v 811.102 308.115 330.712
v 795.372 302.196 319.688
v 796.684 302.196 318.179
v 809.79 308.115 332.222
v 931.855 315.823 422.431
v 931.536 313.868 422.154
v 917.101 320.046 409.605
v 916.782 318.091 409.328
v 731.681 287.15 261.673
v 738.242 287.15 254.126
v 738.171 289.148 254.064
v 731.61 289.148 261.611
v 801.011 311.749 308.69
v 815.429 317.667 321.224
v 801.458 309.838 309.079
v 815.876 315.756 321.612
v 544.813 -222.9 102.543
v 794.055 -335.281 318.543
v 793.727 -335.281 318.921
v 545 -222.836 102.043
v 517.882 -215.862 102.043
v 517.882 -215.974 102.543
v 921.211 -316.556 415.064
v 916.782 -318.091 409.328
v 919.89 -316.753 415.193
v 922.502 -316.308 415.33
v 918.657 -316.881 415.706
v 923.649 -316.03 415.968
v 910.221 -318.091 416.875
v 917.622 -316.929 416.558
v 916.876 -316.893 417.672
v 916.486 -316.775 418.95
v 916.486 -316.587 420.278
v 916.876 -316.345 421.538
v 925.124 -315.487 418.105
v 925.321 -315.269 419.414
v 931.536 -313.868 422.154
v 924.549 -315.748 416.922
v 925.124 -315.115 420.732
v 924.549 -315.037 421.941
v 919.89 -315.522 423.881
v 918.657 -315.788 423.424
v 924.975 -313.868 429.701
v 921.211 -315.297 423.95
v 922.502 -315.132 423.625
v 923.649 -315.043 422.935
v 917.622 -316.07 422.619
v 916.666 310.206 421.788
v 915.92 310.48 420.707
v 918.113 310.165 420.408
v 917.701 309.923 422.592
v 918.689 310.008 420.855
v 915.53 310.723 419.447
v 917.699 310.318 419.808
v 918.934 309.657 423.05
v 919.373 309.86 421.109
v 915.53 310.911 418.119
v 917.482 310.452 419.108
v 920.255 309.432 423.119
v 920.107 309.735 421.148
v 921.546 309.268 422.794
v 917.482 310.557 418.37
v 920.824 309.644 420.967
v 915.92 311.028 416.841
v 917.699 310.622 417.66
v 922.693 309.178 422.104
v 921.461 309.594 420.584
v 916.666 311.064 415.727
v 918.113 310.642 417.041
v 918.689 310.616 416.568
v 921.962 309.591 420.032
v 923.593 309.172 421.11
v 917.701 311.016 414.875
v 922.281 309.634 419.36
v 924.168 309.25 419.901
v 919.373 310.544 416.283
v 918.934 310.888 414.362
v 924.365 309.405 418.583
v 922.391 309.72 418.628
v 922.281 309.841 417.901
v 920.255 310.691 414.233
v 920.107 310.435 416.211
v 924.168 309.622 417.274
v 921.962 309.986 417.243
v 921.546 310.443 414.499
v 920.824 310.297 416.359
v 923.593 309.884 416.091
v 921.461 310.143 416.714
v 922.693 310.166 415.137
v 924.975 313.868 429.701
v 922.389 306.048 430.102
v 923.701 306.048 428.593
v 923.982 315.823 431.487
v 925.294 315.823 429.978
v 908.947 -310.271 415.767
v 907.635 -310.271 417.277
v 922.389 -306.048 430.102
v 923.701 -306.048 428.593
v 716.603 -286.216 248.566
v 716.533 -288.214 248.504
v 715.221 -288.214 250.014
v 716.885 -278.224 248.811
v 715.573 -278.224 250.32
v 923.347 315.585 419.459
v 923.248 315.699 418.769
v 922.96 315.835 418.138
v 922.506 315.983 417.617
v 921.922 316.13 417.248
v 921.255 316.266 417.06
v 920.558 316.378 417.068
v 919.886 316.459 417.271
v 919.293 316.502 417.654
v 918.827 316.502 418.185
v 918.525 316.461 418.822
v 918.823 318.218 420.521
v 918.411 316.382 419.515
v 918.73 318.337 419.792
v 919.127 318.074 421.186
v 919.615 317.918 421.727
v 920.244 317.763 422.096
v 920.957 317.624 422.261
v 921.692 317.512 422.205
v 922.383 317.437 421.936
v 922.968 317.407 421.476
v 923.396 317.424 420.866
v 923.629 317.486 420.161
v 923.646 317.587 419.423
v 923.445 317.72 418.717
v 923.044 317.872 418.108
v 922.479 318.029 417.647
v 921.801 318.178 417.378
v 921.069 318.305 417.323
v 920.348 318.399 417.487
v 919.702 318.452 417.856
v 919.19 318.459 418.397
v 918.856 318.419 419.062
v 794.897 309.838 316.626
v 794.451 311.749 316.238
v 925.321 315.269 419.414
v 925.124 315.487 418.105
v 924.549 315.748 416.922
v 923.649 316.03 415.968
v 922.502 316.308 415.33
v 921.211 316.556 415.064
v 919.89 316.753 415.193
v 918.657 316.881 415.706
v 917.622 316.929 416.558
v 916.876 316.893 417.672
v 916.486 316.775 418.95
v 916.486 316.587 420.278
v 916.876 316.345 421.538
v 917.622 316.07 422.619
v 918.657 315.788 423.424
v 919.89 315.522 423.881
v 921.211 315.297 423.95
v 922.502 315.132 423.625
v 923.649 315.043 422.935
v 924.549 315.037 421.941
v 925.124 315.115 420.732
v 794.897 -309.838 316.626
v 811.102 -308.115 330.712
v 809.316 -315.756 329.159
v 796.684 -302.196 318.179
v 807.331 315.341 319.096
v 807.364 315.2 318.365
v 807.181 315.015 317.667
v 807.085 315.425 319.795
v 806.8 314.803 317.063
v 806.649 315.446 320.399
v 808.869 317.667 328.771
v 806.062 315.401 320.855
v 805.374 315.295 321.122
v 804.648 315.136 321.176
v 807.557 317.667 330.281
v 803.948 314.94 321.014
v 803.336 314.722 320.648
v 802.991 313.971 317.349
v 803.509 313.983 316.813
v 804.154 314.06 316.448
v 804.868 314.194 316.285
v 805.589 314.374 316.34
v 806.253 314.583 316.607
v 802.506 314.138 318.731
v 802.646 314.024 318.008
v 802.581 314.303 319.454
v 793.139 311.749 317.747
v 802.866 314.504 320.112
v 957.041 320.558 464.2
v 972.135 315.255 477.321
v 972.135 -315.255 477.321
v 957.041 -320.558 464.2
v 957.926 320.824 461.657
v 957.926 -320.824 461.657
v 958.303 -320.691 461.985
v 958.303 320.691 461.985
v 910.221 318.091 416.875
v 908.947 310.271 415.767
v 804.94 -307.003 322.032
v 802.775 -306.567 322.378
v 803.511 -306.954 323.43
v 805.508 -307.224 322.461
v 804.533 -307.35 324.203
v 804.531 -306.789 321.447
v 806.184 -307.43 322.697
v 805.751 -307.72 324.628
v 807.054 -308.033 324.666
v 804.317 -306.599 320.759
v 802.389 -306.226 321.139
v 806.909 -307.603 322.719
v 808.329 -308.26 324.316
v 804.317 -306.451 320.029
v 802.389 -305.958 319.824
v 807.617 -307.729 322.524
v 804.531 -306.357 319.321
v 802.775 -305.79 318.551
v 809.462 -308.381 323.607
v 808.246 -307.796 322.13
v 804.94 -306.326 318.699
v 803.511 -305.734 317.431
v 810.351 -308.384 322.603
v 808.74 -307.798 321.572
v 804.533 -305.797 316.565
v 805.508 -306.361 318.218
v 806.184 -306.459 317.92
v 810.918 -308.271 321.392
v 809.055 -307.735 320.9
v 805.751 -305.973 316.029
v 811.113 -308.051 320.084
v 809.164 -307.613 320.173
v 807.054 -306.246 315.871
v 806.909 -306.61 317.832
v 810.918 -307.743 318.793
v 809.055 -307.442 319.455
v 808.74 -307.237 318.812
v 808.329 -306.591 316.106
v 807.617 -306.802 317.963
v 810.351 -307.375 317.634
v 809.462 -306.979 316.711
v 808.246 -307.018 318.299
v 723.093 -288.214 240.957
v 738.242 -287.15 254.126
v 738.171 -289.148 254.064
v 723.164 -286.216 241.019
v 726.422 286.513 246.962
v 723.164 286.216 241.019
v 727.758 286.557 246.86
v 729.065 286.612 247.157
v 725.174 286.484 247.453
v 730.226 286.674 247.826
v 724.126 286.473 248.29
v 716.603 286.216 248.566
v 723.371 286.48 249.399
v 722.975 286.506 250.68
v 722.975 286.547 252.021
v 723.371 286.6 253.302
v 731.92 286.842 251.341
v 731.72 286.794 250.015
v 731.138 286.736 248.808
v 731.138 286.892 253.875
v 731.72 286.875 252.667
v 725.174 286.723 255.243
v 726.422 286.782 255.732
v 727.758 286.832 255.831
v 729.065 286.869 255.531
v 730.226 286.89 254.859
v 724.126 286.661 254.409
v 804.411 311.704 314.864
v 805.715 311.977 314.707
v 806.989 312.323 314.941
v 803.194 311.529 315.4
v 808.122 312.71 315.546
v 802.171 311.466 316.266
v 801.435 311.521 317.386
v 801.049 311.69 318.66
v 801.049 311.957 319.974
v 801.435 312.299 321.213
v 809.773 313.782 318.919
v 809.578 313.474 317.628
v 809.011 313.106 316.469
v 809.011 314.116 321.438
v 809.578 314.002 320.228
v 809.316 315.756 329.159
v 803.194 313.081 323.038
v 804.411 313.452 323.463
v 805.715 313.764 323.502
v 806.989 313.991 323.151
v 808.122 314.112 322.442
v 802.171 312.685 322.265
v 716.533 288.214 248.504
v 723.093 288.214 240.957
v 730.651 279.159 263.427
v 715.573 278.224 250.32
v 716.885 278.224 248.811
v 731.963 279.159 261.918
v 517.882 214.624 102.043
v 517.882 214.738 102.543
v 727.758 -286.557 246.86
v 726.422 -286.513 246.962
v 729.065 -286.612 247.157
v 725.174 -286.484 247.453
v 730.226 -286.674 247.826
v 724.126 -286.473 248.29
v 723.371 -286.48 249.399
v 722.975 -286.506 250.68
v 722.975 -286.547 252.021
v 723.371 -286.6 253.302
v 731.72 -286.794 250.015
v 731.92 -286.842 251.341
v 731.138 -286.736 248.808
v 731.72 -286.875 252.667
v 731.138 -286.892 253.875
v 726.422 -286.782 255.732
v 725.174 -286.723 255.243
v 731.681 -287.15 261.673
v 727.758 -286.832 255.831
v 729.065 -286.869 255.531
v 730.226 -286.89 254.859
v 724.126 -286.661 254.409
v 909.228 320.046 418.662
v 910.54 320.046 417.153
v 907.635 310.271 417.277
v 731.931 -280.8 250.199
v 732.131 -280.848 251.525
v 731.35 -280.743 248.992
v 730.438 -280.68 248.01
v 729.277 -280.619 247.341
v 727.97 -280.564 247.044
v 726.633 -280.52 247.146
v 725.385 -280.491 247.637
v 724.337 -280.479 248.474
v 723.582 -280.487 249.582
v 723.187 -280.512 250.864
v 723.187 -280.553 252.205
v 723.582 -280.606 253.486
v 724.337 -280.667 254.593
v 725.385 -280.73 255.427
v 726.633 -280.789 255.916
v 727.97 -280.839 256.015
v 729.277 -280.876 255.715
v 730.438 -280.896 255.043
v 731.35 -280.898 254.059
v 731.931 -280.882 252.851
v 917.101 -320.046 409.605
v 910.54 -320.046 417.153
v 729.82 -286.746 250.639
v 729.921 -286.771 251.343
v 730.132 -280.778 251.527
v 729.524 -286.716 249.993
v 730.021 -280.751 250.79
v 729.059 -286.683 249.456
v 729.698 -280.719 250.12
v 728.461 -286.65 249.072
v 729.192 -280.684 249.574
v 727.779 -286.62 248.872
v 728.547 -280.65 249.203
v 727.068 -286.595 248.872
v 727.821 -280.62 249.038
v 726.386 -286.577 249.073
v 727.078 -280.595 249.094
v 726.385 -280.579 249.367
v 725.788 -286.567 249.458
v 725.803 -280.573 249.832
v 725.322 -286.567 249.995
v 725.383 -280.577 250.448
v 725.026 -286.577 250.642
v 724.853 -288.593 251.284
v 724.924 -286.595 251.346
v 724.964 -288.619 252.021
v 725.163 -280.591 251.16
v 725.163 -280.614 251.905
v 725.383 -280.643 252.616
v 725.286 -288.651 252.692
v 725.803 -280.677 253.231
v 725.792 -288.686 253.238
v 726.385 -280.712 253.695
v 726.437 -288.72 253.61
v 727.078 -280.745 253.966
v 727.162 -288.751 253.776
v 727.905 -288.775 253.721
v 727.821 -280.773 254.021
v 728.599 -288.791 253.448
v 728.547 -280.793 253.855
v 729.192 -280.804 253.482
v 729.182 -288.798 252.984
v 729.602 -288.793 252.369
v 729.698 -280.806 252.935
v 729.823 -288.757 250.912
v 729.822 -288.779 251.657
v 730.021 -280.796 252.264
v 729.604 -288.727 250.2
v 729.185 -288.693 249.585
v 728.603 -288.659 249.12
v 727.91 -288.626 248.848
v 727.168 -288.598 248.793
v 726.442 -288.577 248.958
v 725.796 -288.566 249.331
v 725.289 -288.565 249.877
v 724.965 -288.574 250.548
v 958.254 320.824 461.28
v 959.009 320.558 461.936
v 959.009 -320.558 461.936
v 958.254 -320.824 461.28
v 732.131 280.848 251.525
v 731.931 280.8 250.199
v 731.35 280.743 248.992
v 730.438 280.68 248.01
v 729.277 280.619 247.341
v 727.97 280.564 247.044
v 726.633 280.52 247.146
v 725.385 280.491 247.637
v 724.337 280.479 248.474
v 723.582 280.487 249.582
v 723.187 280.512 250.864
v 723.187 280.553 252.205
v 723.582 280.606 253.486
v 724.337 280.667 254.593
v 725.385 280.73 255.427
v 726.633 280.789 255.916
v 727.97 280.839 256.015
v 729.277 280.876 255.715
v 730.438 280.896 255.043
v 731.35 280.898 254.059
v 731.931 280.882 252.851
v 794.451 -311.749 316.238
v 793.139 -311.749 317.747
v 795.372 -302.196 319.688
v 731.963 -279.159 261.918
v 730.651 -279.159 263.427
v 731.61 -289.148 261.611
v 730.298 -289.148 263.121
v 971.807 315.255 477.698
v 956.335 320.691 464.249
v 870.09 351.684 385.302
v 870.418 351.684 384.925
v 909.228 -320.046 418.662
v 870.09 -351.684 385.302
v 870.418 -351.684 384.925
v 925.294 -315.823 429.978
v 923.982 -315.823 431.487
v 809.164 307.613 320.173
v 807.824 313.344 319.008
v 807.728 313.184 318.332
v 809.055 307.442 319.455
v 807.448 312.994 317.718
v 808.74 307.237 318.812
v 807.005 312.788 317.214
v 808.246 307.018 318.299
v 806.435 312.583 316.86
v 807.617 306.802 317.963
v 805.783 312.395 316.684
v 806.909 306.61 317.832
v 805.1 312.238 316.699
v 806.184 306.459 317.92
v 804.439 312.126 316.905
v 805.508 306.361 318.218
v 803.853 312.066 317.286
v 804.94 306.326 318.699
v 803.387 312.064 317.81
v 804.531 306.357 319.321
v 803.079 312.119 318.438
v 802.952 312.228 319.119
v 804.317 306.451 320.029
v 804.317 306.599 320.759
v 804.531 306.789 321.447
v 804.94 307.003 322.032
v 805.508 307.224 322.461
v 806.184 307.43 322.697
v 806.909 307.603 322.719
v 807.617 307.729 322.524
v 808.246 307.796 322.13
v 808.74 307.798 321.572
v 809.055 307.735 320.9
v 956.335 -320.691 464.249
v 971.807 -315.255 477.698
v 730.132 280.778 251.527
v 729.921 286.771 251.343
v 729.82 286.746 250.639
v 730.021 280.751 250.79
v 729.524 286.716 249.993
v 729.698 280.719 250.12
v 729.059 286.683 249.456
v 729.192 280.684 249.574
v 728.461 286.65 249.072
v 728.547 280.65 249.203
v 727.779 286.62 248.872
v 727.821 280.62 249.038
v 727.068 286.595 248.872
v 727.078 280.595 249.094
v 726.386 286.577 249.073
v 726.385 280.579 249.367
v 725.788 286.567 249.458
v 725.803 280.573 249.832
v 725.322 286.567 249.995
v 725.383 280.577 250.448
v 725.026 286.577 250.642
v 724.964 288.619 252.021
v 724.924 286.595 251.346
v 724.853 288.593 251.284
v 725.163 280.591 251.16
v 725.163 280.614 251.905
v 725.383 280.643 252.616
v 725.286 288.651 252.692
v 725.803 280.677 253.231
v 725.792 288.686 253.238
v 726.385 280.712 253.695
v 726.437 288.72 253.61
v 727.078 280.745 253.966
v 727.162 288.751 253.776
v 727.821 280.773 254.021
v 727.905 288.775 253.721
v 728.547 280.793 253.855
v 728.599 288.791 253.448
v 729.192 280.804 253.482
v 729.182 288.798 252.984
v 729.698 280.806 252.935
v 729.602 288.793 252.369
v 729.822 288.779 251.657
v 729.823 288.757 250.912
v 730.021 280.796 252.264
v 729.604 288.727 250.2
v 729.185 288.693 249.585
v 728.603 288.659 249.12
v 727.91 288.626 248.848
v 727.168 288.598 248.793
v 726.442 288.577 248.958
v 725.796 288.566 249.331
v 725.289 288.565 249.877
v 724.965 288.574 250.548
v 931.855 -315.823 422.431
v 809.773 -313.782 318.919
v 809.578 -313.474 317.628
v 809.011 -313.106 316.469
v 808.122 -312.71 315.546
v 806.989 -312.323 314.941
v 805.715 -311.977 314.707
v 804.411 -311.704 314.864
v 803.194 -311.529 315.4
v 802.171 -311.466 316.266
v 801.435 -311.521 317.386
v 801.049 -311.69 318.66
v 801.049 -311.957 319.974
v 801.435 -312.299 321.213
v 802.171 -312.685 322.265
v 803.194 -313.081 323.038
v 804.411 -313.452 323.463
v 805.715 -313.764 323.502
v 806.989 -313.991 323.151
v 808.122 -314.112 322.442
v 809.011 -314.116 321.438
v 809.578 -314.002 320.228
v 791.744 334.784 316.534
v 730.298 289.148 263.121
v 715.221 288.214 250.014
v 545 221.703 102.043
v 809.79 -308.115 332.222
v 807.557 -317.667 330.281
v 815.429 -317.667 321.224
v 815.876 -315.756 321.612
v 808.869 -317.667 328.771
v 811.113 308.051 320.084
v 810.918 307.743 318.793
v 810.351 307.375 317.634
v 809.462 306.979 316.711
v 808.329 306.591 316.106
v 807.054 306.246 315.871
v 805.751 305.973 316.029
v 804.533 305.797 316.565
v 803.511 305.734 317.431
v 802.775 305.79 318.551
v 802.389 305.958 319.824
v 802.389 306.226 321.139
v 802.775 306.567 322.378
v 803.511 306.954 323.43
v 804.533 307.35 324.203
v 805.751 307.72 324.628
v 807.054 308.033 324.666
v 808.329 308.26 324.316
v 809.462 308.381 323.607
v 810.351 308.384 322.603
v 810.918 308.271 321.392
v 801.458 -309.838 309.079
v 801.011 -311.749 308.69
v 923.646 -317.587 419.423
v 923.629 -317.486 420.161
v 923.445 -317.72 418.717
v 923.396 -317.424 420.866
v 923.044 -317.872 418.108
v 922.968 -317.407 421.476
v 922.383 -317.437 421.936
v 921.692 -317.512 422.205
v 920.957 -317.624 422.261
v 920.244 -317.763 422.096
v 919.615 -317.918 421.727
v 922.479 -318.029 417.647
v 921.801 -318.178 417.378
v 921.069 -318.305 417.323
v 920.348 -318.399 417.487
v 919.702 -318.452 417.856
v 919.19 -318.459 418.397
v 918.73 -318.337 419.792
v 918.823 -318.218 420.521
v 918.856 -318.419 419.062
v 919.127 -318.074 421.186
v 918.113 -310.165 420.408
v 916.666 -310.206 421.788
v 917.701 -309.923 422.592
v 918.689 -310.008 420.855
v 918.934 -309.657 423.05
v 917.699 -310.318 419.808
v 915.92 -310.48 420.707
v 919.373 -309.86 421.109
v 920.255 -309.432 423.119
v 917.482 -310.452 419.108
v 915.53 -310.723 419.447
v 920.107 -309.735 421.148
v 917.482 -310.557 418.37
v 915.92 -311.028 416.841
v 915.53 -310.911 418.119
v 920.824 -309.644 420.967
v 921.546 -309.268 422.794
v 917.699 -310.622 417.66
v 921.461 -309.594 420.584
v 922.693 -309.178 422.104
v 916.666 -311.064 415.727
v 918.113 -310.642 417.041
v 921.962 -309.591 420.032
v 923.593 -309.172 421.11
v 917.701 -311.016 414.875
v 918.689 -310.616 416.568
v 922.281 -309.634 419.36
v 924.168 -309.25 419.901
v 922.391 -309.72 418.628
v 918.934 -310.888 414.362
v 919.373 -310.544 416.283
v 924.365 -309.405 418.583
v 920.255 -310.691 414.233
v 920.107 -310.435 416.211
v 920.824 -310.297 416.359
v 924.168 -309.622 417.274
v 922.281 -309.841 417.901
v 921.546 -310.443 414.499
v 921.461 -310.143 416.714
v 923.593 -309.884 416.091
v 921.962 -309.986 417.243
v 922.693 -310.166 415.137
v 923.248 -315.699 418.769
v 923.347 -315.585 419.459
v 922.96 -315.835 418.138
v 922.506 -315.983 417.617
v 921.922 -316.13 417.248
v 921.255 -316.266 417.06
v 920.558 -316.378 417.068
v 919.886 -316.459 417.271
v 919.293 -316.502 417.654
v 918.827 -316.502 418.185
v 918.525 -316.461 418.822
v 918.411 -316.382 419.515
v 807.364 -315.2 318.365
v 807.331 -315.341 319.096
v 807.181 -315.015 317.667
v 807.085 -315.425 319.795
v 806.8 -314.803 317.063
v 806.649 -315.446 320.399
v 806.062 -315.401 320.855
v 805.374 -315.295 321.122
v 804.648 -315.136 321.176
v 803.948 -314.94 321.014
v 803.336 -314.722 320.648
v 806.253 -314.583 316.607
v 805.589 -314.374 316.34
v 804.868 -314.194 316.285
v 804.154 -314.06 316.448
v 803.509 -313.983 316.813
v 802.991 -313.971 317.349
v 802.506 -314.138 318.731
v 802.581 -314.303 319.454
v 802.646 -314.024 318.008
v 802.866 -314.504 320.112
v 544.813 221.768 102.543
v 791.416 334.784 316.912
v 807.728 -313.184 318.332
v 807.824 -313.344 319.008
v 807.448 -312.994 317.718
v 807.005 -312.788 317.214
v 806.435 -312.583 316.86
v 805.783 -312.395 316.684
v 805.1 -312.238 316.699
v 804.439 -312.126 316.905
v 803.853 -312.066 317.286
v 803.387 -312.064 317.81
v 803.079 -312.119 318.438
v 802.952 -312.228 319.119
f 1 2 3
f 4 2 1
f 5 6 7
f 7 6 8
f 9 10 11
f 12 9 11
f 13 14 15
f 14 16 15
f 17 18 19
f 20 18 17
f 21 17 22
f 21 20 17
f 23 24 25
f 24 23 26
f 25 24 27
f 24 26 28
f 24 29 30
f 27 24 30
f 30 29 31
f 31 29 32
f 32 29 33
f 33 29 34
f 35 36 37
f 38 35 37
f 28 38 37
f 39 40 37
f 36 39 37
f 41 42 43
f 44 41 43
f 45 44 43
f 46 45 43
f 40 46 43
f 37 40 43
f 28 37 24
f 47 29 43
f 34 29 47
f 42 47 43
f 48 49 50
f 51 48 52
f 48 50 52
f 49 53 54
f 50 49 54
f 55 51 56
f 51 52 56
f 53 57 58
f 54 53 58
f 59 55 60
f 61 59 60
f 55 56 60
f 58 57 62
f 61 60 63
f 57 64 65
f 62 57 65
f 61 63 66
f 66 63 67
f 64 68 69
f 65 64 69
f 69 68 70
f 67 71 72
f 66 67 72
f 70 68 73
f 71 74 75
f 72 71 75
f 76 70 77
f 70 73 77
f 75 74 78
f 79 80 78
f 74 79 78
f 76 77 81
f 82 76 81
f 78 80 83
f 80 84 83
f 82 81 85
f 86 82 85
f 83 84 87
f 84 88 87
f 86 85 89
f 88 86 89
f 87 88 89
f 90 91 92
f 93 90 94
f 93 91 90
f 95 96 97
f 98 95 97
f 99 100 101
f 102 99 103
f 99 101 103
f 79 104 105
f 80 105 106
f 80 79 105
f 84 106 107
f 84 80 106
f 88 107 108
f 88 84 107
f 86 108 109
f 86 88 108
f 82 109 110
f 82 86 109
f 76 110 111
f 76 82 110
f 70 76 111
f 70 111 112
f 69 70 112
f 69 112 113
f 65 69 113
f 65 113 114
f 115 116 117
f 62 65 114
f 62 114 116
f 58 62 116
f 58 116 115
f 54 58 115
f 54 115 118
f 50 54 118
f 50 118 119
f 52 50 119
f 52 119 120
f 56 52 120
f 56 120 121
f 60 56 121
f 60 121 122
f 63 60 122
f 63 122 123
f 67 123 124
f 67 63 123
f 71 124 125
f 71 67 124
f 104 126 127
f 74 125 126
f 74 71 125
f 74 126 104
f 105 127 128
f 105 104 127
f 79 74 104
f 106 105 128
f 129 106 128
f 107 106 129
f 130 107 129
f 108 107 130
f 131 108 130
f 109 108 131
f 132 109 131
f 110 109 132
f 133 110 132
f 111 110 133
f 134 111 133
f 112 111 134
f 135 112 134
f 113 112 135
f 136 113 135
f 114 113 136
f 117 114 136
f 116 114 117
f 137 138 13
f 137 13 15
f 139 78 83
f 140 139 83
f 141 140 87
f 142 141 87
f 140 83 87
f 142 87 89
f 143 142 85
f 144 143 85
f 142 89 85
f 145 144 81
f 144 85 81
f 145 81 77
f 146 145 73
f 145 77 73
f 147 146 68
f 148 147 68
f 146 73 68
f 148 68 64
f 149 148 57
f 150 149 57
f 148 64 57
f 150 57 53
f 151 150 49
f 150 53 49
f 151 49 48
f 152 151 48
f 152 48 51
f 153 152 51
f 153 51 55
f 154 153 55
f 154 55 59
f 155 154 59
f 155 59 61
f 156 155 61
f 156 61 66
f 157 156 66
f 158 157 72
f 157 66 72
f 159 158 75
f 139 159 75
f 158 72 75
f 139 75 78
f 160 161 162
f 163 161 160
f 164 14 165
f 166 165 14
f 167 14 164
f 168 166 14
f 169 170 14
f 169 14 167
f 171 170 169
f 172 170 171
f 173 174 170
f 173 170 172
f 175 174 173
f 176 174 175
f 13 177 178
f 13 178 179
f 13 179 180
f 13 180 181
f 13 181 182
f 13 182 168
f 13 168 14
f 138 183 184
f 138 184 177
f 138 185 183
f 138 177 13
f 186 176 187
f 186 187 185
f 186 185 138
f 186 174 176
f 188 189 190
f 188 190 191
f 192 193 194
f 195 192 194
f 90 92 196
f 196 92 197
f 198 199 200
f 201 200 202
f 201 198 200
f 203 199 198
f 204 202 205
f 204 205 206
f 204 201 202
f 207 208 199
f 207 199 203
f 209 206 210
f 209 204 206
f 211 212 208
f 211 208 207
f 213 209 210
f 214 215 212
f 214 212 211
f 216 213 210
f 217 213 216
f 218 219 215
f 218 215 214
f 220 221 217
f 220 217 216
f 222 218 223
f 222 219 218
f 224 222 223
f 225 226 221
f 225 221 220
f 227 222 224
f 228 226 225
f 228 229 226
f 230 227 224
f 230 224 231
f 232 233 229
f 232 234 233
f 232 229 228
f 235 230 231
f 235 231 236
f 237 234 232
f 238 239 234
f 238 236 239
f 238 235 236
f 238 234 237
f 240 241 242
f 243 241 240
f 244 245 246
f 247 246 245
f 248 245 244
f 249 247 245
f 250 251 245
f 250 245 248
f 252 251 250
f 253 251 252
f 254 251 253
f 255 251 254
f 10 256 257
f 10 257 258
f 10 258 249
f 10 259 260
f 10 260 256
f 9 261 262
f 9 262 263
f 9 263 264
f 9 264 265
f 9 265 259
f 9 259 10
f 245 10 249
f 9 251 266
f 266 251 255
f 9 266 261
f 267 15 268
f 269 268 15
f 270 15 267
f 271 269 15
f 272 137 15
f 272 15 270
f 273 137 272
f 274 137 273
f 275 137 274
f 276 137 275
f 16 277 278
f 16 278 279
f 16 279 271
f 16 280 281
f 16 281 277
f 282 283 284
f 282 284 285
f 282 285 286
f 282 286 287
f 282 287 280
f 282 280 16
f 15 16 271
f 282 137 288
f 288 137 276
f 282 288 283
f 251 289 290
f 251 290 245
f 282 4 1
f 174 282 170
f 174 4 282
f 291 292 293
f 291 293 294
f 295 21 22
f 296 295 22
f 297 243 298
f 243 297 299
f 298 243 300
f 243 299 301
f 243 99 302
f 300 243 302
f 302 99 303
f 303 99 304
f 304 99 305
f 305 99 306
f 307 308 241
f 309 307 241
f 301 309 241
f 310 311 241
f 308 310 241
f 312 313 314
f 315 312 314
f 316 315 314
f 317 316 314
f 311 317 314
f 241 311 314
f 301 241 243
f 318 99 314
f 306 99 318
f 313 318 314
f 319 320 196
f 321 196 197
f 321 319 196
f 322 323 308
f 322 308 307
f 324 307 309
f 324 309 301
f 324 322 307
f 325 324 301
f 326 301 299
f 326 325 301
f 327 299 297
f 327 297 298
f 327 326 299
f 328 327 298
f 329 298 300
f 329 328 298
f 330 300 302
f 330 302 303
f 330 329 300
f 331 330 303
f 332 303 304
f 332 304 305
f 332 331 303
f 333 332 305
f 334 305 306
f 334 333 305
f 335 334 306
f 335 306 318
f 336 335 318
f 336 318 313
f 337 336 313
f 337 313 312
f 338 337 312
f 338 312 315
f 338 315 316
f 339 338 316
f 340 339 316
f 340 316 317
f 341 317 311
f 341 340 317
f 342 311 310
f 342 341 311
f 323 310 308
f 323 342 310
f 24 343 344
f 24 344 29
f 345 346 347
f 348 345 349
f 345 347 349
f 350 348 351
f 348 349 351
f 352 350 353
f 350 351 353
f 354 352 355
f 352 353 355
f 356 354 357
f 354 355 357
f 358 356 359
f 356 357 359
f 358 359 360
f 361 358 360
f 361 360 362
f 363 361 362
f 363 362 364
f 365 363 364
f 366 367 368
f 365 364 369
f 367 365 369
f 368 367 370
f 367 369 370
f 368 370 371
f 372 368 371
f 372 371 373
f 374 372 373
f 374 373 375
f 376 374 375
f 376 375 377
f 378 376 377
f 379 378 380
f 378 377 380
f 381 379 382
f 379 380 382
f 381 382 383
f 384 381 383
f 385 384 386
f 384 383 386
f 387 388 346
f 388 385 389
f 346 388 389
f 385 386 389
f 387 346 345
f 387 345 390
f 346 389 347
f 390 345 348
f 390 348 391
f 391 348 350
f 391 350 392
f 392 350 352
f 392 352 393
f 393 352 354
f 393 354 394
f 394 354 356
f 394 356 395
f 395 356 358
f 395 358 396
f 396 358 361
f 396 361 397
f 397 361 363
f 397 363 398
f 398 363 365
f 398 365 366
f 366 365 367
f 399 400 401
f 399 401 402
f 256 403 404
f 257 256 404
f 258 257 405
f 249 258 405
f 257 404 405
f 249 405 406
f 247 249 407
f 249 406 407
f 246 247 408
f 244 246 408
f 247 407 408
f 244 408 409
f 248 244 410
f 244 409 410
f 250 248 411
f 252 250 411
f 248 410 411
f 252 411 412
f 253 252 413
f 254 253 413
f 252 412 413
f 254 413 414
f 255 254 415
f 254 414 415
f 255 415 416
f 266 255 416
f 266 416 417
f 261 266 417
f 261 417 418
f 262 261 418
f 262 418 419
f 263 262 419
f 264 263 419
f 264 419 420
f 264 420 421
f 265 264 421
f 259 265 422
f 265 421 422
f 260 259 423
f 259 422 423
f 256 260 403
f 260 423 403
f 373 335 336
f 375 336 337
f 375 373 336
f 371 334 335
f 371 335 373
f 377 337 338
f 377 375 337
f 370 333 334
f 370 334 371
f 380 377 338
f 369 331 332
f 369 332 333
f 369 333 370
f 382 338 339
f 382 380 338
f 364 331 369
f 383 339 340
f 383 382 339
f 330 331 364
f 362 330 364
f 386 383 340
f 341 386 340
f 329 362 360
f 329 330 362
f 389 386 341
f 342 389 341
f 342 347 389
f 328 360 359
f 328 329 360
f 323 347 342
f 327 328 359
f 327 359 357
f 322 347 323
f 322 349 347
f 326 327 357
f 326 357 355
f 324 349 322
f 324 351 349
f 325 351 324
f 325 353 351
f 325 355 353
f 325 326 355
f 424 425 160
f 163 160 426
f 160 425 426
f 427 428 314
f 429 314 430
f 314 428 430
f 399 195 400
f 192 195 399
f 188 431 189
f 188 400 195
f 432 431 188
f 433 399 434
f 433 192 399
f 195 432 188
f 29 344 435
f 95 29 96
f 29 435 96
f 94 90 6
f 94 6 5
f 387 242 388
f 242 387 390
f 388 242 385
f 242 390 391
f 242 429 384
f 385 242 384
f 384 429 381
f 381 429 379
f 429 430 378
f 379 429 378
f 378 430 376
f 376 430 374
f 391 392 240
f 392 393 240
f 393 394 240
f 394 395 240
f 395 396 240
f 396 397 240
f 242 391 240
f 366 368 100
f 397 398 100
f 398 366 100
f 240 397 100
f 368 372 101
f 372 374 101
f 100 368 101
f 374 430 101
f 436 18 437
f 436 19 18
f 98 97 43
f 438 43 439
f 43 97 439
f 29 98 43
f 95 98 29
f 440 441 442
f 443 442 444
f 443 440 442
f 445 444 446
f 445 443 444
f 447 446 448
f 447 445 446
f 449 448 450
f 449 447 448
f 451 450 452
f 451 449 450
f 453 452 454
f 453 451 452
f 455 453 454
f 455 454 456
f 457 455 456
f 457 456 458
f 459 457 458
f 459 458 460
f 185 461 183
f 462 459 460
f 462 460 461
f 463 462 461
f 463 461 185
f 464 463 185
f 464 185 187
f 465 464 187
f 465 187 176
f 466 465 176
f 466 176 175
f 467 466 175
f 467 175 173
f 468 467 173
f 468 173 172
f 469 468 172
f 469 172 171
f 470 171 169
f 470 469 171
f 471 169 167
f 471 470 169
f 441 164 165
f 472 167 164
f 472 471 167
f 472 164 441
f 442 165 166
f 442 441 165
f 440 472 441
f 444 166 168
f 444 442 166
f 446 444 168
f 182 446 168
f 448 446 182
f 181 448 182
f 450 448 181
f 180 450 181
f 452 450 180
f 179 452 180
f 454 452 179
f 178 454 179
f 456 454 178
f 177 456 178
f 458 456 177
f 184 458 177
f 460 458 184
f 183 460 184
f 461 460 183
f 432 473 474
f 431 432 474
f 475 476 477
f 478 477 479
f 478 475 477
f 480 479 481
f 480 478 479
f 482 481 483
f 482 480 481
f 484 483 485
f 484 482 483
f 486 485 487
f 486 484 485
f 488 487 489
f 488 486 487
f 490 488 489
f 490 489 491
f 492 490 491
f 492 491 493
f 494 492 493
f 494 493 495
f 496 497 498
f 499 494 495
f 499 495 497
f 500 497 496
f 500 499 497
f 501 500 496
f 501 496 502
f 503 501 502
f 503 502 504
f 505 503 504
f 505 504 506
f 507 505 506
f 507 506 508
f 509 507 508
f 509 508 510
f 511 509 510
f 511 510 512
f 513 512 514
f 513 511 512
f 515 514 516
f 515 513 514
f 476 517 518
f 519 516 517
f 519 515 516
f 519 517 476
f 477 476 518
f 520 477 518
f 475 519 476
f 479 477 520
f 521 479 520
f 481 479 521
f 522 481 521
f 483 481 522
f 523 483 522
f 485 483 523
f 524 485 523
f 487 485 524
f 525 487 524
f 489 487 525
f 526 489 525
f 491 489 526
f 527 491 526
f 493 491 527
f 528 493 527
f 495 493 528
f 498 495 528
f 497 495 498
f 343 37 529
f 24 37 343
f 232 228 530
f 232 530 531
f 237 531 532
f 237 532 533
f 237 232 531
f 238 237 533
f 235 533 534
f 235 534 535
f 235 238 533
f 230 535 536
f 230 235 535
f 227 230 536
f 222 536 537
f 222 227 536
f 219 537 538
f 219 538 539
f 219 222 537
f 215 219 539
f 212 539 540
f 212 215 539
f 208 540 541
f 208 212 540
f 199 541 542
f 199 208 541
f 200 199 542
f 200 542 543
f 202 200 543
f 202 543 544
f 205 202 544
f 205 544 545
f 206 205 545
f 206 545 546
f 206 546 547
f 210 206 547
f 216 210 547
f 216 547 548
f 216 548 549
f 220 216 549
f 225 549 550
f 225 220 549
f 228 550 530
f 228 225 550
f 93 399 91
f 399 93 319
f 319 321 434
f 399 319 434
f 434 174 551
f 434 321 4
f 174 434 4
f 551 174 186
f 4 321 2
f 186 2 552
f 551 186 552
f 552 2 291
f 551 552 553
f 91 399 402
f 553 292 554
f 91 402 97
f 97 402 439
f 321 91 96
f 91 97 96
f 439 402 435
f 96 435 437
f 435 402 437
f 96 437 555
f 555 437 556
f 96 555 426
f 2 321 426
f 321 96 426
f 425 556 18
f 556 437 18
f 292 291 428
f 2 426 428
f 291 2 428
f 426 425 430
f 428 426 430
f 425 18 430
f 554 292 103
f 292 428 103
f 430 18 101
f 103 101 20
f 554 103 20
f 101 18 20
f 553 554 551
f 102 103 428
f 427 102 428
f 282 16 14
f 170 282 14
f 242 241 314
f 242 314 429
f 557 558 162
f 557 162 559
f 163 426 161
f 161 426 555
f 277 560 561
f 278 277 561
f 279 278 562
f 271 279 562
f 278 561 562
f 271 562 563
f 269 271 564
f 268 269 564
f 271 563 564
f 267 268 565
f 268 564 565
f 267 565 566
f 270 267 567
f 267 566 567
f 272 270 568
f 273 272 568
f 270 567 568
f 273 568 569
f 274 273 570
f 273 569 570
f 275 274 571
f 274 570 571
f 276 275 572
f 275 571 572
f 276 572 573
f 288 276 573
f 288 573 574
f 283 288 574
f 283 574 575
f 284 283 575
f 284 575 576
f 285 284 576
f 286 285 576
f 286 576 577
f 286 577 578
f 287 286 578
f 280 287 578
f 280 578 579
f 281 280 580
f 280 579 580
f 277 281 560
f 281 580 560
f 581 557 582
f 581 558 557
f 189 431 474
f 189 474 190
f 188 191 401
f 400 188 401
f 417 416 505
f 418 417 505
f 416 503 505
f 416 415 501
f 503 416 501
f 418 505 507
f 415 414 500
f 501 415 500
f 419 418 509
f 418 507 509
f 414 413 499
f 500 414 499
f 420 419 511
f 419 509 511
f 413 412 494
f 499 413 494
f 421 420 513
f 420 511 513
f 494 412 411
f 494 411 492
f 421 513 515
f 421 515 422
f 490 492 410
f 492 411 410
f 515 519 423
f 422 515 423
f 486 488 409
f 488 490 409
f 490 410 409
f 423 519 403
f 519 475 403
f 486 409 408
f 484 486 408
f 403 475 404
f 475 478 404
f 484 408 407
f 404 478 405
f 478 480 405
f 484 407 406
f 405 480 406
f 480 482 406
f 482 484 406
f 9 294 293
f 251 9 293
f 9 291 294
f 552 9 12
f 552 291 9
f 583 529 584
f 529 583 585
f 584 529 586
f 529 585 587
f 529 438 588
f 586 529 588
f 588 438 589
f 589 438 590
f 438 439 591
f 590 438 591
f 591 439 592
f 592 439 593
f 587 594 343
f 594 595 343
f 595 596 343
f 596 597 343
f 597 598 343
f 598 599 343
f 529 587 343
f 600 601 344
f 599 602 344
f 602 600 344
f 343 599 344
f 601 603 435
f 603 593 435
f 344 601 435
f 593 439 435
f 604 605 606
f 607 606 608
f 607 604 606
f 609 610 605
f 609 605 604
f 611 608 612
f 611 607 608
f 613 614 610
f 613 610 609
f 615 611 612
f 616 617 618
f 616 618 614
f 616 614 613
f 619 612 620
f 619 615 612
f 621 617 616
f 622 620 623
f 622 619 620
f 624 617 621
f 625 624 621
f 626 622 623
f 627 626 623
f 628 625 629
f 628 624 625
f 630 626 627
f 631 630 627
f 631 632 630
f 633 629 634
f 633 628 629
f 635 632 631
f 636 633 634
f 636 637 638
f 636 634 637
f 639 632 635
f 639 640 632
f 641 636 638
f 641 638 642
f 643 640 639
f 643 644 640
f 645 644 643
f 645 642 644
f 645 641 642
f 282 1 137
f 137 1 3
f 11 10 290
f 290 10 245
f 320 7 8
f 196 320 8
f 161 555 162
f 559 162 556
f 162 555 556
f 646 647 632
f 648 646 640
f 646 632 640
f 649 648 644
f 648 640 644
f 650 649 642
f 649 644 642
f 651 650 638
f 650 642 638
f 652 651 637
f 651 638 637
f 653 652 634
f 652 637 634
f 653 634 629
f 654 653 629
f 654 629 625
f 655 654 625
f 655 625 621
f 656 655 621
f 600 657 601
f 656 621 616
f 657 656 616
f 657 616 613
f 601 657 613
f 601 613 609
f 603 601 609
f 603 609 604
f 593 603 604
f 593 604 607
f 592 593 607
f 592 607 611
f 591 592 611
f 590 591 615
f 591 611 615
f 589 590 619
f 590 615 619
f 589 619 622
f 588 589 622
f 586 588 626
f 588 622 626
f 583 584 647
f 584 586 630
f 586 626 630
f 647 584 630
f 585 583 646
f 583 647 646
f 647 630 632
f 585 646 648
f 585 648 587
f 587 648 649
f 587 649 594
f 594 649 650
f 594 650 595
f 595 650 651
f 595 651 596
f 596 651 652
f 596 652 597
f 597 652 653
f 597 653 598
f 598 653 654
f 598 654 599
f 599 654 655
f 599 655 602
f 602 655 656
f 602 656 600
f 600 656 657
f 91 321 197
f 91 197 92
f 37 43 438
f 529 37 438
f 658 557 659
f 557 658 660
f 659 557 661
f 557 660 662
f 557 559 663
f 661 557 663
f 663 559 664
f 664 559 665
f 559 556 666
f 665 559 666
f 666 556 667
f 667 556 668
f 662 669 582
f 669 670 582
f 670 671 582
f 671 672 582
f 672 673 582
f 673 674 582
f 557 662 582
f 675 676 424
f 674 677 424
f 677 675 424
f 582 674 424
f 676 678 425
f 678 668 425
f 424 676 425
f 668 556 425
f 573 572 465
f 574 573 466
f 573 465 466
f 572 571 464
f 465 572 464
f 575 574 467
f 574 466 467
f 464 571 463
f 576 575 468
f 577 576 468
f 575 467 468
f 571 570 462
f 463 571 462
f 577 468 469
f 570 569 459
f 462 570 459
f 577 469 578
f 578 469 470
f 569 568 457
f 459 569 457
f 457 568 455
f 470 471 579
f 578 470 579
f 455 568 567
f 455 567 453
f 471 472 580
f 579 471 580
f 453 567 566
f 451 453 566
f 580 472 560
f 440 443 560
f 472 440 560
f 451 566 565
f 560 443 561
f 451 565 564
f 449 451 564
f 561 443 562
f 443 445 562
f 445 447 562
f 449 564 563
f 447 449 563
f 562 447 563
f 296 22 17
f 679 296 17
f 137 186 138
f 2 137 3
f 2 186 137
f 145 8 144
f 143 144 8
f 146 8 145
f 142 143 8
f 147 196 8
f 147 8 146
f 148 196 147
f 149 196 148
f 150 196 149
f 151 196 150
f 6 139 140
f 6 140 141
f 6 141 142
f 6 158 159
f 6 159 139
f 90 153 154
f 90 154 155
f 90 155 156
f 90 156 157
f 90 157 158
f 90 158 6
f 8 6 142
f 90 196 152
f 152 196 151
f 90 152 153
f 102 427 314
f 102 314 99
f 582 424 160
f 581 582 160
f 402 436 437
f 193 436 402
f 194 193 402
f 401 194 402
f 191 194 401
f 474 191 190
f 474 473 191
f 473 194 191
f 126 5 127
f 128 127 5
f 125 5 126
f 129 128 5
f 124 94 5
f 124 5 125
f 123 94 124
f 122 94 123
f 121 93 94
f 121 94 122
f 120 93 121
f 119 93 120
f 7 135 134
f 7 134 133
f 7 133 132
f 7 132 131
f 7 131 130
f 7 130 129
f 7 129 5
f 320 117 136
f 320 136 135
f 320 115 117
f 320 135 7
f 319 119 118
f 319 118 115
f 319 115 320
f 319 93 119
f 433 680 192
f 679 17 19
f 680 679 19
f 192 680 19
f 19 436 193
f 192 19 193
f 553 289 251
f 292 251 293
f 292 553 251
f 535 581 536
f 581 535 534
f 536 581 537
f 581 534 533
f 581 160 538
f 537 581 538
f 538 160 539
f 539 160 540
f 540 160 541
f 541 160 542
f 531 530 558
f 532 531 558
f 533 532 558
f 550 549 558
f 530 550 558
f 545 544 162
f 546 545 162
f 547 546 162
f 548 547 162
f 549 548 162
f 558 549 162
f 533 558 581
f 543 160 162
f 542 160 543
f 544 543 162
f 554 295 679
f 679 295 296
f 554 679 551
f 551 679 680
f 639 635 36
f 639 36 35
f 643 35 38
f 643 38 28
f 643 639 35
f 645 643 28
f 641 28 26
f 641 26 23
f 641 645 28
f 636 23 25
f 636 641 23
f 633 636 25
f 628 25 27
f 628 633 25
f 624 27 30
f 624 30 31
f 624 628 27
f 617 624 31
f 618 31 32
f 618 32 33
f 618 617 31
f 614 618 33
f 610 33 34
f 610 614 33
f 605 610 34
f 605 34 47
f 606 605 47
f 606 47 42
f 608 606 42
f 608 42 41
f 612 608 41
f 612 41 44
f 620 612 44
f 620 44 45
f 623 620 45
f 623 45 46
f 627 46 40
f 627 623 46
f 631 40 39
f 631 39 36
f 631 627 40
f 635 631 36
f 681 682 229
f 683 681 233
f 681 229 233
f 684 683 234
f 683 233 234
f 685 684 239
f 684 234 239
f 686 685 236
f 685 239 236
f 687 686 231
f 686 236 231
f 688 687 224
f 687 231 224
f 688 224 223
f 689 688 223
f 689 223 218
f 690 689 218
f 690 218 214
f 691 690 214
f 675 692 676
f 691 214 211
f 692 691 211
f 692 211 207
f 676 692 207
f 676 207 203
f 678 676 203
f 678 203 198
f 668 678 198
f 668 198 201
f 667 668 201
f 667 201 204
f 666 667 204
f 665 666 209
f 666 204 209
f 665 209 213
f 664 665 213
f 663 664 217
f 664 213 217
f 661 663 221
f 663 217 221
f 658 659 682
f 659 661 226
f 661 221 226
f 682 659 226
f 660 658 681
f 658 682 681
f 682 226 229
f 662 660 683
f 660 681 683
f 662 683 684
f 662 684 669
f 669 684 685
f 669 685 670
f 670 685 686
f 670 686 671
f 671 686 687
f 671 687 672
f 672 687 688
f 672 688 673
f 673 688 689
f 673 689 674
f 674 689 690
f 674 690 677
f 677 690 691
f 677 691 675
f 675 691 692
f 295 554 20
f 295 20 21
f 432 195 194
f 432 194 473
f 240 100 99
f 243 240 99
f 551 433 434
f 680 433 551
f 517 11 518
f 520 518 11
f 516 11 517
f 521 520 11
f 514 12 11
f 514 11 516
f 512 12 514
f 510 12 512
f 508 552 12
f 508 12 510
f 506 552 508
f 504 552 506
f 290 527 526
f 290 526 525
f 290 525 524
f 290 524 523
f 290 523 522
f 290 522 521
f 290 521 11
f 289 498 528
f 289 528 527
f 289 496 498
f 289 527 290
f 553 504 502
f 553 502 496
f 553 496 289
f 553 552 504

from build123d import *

# Parameters (mm, degrees)
WYCI_GNI_CIE_CIENKA_CIANKA1_DEPTH      = 400
WYCI_GNI_CIE_CIENKA_CIANKA1_DEPTH_BACK = 400
LUSTRO2_START                          = 277.039042492
LUSTRO2_DEPTH                          = 3.5
DODANIE_WYCI_GNI_CIE1_DEPTH            = 2
WYCI_GNI_CIE_CIENKA_CIANKA2_DEPTH      = 10
SZKIC12_R                              = 2.5
WYTNIJ_WYCI_GNI_CIE1_DEPTH             = 6
DODANIE_WYCI_GNI_CIE2_DEPTH            = 2
WYCI_GNI_CIE_CIENKA_CIANKA3_DEPTH      = 10
SZKIC16_R                              = 2.5
WYTNIJ_WYCI_GNI_CIE2_DEPTH             = 6
DODANIE_WYCI_GNI_CIE3_DEPTH            = 2
WYCI_GNI_CIE_CIENKA_CIANKA4_DEPTH      = 10
SZKIC19_R                              = 2.5
WYTNIJ_WYCI_GNI_CIE3_DEPTH             = 6
EXTRUDE_THIN1_START                    = 6
SZKIC19_2_R                            = 4.5
SZKIC19_2_R_2                          = 2.5
EXTRUDE_THIN1_DEPTH                    = 6
EXTRUDE_THIN2_START                    = 6
SZKIC16_2_R                            = 4.5
SZKIC16_2_R_2                          = 2.5
EXTRUDE_THIN2_DEPTH                    = 6
EXTRUDE_THIN3_START                    = 6
SZKIC12_2_R                            = 4.5
SZKIC12_2_R_2                          = 2.5
EXTRUDE_THIN3_DEPTH                    = 6


# Read off the part's stored shape, not the designer's step: Lustro2
with BuildPart() as part:
    # Szkic1 → Wyciągnięcie-cienka ścianka1 (new, two sides: drawn at the far end of the back side and taken through both)
    with BuildSketch(Plane(origin=(0, 0, 0), x_dir=(1, 0, 0), z_dir=(0, 1, 0)).offset(-WYCI_GNI_CIE_CIENKA_CIANKA1_DEPTH_BACK)):
        Polygon((972.134722106, -477.320983834), (957.040530502, -464.199803255), (959.008707589, -461.935674514), (958.253998008, -461.279615485), (545, -102.043395667), (517.881642578, -102.043395667), (517.881642578, -102.543395667), (544.81305766, -102.543395667), (957.925968494, -461.656970275), (958.303323284, -461.98499979), (956.335146197, -464.24912853), (971.806692592, -477.698338624), align=None)
    extrude(amount=WYCI_GNI_CIE_CIENKA_CIANKA1_DEPTH + WYCI_GNI_CIE_CIENKA_CIANKA1_DEPTH_BACK)

    # Cięcie powierzchnią2
    split(bisect_by=Plane(origin=(-13.122082675, 50.268990001, -11.406852442), x_dir=(0.6328754019355285, 0.32469887066665293, 0.7028793417171568), z_dir=(0.24669767629086262, -0.945066673459785, 0.21445101824972695)), keep=Keep.TOP)

    # Cięcie powierzchnią3
    split(bisect_by=Plane(origin=(-13.795060398, -53.64380516, -11.991863051), x_dir=(-0.7143770117085512, 0.3225312314146349, -0.6209984620790296), z_dir=(-0.24341741026967303, -0.9465588226635253, -0.21159952650099761)), keep=Keep.BOTTOM)

    # Cięcie powierzchnią4
    split(bisect_by=Plane(origin=(-24.349944471, -199.016868, -21.167083796), x_dir=(0.7449832908348125, -0.1600276007809854, 0.6476040946173941), z_dir=(-0.12077436340947467, -0.987112540183885, -0.10498755238005406)), keep=Keep.BOTTOM)

    # Cięcie powierzchnią5
    split(bisect_by=Plane(origin=(110.843151094, -553.888363867, 96.354481224), x_dir=(0.7294998198065532, 0.25630205312360615, 0.6341445185971655), z_dir=(0.19343361492315114, -0.9665967398893007, 0.1681492761005468)), keep=Keep.BOTTOM)

    # Lustro2 outline → Lustro2 (cut)
    with BuildSketch(Plane(origin=(0, 0, 0), x_dir=(0.754709580222771, 0, 0.6560590289905086), z_dir=(0.6560590289905085, 0, -0.754709580222771)).offset(LUSTRO2_START)):
        Polygon((909.445947287, -351.683941116), (805.20178126, -334.784202631), (993.753311489, -400), (1046.830129212, -400), (1046.830129212, -315.255256391), align=None)
    extrude(amount=LUSTRO2_DEPTH, mode=Mode.SUBTRACT)

    # Szkic10 → Dodanie-wyciągnięcie1 (add)
    with BuildSketch(Plane(origin=(184.050171811, 0, -211.725502995), x_dir=(-0.7547095802227711, 0, -0.6560590289905084), z_dir=(0.6560590289905084, 0, -0.7547095802227711))):
        Polygon((-723.785887875, -289.14803149), (-703.807733048, -288.213510375), (-704.274993606, -278.224432962), (-724.253148432, -279.158954077), align=None)
    dodanie_wyci_gni_cie1 = extrude(amount=DODANIE_WYCI_GNI_CIE1_DEPTH)

    # Szkic11 → Wyciągnięcie-cienka ścianka2 (add)
    with BuildSketch(Plane(origin=(185.362289869, 0, -213.234922155), x_dir=(-0.7547095802227721, 0, -0.6560590289905072), z_dir=(0.6560590289905072, 0, -0.7547095802227721))):
        Polygon((-723.785887875, -289.14803149), (-703.807733048, -288.213510375), (-703.901185159, -286.215694893), (-723.879339986, -287.150216008), align=None)
    wyci_gni_cie_cienka_cianka2 = extrude(amount=WYCI_GNI_CIE_CIENKA_CIANKA2_DEPTH)

    # Szkic12 → Wytnij-wyciągnięcie1 (cut)
    with BuildSketch(Plane(origin=(-8.922386764, -252.736192146, -7.756112483), x_dir=(0.9993780104898576, -0.03524800775504095, -0.0010817109755482265), z_dir=(0.035264601930747055, 0.9989077413419046, 0.030655050772765847))):
        with Locations(Location((736.803075954, -260.021158903, 0), (0, 0, 179.937993373))):
            Circle(SZKIC12_R)
    wytnij_wyci_gni_cie1 = extrude(amount=-WYTNIJ_WYCI_GNI_CIE1_DEPTH, mode=Mode.SUBTRACT)

    # Szkic14 → Dodanie-wyciągnięcie2 (add)
    with BuildSketch(Plane(origin=(184.050171811, 0, -211.725502995), x_dir=(-0.7547095802227711, 0, -0.6560590289905084), z_dir=(0.6560590289905084, 0, -0.7547095802227711))):
        Polygon((-826.154339771, -317.666675693), (-807.050007897, -311.748525334), (-810.009083077, -302.196359397), (-829.11341495, -308.114509757), align=None)
    dodanie_wyci_gni_cie2 = extrude(amount=DODANIE_WYCI_GNI_CIE2_DEPTH)

    # Szkic15 → Wyciągnięcie-cienka ścianka3 (add)
    with BuildSketch(Plane(origin=(185.362289869, 0, -213.234922155), x_dir=(-0.7547095802227656, 8.492898931658996e-15, -0.6560590289905148), z_dir=(0.6560590289905147, 9.769962616701384e-15, -0.7547095802227655))):
        Polygon((-826.154339771, -317.666675693), (-807.050007897, -311.748525334), (-807.641822933, -309.838092146), (-826.746154807, -315.756242506), align=None)
    wyci_gni_cie_cienka_cianka3 = extrude(amount=WYCI_GNI_CIE_CIENKA_CIANKA3_DEPTH)

    # Szkic16 → Wytnij-wyciągnięcie2 (cut)
    with BuildSketch(Plane(origin=(-12.723943102, -54.423656206, -11.060754992), x_dir=(0.9747442148680406, -0.21885025353139564, -0.04447788338636554), z_dir=(0.22332423867840068, 0.9552165936601662, 0.1941327989160557))):
        with Locations(Location((839.308044037, -375.023490092, 0), (0, 0, 177.401291281))):
            Circle(SZKIC16_R)
    wytnij_wyci_gni_cie2 = extrude(amount=-WYTNIJ_WYCI_GNI_CIE2_DEPTH, mode=Mode.SUBTRACT)

    # Szkic17 → Dodanie-wyciągnięcie3 (add)
    with BuildSketch(Plane(origin=(184.050171811, 0, -211.725502995), x_dir=(-0.7547095802227711, 0, -0.6560590289905084), z_dir=(0.6560590289905084, 0, -0.7547095802227711))):
        Polygon((-980.419174897, -315.823054253), (-960.869985355, -320.045516598), (-958.758754182, -310.270921827), (-978.307943724, -306.048459483), align=None)
    dodanie_wyci_gni_cie3 = extrude(amount=DODANIE_WYCI_GNI_CIE3_DEPTH)

    # Szkic18 → Wyciągnięcie-cienka ścianka4 (add)
    with BuildSketch(Plane(origin=(185.362289869, 0, -213.234922155), x_dir=(-0.7547095802227731, -3.9689825973234995e-15, -0.656059028990506), z_dir=(0.656059028990506, -4.565792188770957e-15, -0.7547095802227731))):
        Polygon((-980.419174897, -315.823054253), (-960.869985355, -320.045516598), (-960.44773912, -318.090597644), (-979.996928662, -313.868135299), align=None)
    wyci_gni_cie_cienka_cianka4 = extrude(amount=WYCI_GNI_CIE_CIENKA_CIANKA4_DEPTH)

    # Szkic19 → Wytnij-wyciągnięcie3 (cut)
    with BuildSketch(Plane(origin=(81.850178316, -502.114472254, 71.151274498), x_dir=(0.9872243085600819, 0.15776060888456483, -0.022355197884150288), z_dir=(-0.15933663918907087, 0.9774594770966201, -0.138509227295274))):
        with Locations(Location((849.886383223, -371.032714173, 0), (0, 0, 178.706565483))):
            Circle(SZKIC19_R)
    wytnij_wyci_gni_cie3 = extrude(amount=-WYTNIJ_WYCI_GNI_CIE3_DEPTH, mode=Mode.SUBTRACT)

    # Szkic19<2> → Extrude-Thin1 (add)
    with BuildSketch(Plane(origin=(81.850178316, -502.114472254, 71.151274498), x_dir=(0.9872243085600819, 0.15776060888456483, -0.022355197884150288), z_dir=(-0.15933663918907087, 0.9774594770966201, -0.138509227295274)).offset(EXTRUDE_THIN1_START)):
        with Locations((849.886383223, -371.032714173)):
            Circle(SZKIC19_2_R)
        with Locations((849.886383223, -371.032714173)):
            Circle(SZKIC19_2_R_2, mode=Mode.SUBTRACT)
    extrude_thin1 = extrude(amount=-EXTRUDE_THIN1_DEPTH)

    # Szkic16<2> → Extrude-Thin2 (add)
    with BuildSketch(Plane(origin=(-12.723943102, -54.423656206, -11.060754992), x_dir=(0.9747442148680406, -0.21885025353139564, -0.04447788338636554), z_dir=(0.22332423867840068, 0.9552165936601662, 0.1941327989160557)).offset(EXTRUDE_THIN2_START)):
        with Locations((839.308044037, -375.023490092)):
            Circle(SZKIC16_2_R)
        with Locations((839.308044037, -375.023490092)):
            Circle(SZKIC16_2_R_2, mode=Mode.SUBTRACT)
    extrude_thin2 = extrude(amount=-EXTRUDE_THIN2_DEPTH)

    # Szkic12<2> → Extrude-Thin3 (add)
    with BuildSketch(Plane(origin=(-8.922386764, -252.736192146, -7.756112483), x_dir=(0.9993780104898576, -0.03524800775504095, -0.0010817109755482265), z_dir=(0.035264601930747055, 0.9989077413419046, 0.030655050772765847)).offset(EXTRUDE_THIN3_START)):
        with Locations((736.803075954, -260.021158903)):
            Circle(SZKIC12_2_R)
        with Locations((736.803075954, -260.021158903)):
            Circle(SZKIC12_2_R_2, mode=Mode.SUBTRACT)
    extrude_thin3 = extrude(amount=-EXTRUDE_THIN3_DEPTH)

    # Lustro3: Dodanie-wyciągnięcie1, Wyciągnięcie-cienka ścianka2, Wytnij-wyciągnięcie1, Dodanie-wyciągnięcie2, Wyciągnięcie-cienka ścianka3, Wytnij-wyciągnięcie2, Dodanie-wyciągnięcie3, Wyciągnięcie-cienka ścianka4, Wytnij-wyciągnięcie3, Extrude-Thin1, Extrude-Thin2, Extrude-Thin3 across plane
    add(dodanie_wyci_gni_cie1.mirror(Plane.ZX))
    add(wyci_gni_cie_cienka_cianka2.mirror(Plane.ZX))
    add(wytnij_wyci_gni_cie1.mirror(Plane.ZX), mode=Mode.SUBTRACT)
    add(dodanie_wyci_gni_cie2.mirror(Plane.ZX))
    add(wyci_gni_cie_cienka_cianka3.mirror(Plane.ZX))
    add(wytnij_wyci_gni_cie2.mirror(Plane.ZX), mode=Mode.SUBTRACT)
    add(dodanie_wyci_gni_cie3.mirror(Plane.ZX))
    add(wyci_gni_cie_cienka_cianka4.mirror(Plane.ZX))
    add(wytnij_wyci_gni_cie3.mirror(Plane.ZX), mode=Mode.SUBTRACT)
    add(extrude_thin1.mirror(Plane.ZX))
    add(extrude_thin2.mirror(Plane.ZX))
    add(extrude_thin3.mirror(Plane.ZX))


solid = part.part
